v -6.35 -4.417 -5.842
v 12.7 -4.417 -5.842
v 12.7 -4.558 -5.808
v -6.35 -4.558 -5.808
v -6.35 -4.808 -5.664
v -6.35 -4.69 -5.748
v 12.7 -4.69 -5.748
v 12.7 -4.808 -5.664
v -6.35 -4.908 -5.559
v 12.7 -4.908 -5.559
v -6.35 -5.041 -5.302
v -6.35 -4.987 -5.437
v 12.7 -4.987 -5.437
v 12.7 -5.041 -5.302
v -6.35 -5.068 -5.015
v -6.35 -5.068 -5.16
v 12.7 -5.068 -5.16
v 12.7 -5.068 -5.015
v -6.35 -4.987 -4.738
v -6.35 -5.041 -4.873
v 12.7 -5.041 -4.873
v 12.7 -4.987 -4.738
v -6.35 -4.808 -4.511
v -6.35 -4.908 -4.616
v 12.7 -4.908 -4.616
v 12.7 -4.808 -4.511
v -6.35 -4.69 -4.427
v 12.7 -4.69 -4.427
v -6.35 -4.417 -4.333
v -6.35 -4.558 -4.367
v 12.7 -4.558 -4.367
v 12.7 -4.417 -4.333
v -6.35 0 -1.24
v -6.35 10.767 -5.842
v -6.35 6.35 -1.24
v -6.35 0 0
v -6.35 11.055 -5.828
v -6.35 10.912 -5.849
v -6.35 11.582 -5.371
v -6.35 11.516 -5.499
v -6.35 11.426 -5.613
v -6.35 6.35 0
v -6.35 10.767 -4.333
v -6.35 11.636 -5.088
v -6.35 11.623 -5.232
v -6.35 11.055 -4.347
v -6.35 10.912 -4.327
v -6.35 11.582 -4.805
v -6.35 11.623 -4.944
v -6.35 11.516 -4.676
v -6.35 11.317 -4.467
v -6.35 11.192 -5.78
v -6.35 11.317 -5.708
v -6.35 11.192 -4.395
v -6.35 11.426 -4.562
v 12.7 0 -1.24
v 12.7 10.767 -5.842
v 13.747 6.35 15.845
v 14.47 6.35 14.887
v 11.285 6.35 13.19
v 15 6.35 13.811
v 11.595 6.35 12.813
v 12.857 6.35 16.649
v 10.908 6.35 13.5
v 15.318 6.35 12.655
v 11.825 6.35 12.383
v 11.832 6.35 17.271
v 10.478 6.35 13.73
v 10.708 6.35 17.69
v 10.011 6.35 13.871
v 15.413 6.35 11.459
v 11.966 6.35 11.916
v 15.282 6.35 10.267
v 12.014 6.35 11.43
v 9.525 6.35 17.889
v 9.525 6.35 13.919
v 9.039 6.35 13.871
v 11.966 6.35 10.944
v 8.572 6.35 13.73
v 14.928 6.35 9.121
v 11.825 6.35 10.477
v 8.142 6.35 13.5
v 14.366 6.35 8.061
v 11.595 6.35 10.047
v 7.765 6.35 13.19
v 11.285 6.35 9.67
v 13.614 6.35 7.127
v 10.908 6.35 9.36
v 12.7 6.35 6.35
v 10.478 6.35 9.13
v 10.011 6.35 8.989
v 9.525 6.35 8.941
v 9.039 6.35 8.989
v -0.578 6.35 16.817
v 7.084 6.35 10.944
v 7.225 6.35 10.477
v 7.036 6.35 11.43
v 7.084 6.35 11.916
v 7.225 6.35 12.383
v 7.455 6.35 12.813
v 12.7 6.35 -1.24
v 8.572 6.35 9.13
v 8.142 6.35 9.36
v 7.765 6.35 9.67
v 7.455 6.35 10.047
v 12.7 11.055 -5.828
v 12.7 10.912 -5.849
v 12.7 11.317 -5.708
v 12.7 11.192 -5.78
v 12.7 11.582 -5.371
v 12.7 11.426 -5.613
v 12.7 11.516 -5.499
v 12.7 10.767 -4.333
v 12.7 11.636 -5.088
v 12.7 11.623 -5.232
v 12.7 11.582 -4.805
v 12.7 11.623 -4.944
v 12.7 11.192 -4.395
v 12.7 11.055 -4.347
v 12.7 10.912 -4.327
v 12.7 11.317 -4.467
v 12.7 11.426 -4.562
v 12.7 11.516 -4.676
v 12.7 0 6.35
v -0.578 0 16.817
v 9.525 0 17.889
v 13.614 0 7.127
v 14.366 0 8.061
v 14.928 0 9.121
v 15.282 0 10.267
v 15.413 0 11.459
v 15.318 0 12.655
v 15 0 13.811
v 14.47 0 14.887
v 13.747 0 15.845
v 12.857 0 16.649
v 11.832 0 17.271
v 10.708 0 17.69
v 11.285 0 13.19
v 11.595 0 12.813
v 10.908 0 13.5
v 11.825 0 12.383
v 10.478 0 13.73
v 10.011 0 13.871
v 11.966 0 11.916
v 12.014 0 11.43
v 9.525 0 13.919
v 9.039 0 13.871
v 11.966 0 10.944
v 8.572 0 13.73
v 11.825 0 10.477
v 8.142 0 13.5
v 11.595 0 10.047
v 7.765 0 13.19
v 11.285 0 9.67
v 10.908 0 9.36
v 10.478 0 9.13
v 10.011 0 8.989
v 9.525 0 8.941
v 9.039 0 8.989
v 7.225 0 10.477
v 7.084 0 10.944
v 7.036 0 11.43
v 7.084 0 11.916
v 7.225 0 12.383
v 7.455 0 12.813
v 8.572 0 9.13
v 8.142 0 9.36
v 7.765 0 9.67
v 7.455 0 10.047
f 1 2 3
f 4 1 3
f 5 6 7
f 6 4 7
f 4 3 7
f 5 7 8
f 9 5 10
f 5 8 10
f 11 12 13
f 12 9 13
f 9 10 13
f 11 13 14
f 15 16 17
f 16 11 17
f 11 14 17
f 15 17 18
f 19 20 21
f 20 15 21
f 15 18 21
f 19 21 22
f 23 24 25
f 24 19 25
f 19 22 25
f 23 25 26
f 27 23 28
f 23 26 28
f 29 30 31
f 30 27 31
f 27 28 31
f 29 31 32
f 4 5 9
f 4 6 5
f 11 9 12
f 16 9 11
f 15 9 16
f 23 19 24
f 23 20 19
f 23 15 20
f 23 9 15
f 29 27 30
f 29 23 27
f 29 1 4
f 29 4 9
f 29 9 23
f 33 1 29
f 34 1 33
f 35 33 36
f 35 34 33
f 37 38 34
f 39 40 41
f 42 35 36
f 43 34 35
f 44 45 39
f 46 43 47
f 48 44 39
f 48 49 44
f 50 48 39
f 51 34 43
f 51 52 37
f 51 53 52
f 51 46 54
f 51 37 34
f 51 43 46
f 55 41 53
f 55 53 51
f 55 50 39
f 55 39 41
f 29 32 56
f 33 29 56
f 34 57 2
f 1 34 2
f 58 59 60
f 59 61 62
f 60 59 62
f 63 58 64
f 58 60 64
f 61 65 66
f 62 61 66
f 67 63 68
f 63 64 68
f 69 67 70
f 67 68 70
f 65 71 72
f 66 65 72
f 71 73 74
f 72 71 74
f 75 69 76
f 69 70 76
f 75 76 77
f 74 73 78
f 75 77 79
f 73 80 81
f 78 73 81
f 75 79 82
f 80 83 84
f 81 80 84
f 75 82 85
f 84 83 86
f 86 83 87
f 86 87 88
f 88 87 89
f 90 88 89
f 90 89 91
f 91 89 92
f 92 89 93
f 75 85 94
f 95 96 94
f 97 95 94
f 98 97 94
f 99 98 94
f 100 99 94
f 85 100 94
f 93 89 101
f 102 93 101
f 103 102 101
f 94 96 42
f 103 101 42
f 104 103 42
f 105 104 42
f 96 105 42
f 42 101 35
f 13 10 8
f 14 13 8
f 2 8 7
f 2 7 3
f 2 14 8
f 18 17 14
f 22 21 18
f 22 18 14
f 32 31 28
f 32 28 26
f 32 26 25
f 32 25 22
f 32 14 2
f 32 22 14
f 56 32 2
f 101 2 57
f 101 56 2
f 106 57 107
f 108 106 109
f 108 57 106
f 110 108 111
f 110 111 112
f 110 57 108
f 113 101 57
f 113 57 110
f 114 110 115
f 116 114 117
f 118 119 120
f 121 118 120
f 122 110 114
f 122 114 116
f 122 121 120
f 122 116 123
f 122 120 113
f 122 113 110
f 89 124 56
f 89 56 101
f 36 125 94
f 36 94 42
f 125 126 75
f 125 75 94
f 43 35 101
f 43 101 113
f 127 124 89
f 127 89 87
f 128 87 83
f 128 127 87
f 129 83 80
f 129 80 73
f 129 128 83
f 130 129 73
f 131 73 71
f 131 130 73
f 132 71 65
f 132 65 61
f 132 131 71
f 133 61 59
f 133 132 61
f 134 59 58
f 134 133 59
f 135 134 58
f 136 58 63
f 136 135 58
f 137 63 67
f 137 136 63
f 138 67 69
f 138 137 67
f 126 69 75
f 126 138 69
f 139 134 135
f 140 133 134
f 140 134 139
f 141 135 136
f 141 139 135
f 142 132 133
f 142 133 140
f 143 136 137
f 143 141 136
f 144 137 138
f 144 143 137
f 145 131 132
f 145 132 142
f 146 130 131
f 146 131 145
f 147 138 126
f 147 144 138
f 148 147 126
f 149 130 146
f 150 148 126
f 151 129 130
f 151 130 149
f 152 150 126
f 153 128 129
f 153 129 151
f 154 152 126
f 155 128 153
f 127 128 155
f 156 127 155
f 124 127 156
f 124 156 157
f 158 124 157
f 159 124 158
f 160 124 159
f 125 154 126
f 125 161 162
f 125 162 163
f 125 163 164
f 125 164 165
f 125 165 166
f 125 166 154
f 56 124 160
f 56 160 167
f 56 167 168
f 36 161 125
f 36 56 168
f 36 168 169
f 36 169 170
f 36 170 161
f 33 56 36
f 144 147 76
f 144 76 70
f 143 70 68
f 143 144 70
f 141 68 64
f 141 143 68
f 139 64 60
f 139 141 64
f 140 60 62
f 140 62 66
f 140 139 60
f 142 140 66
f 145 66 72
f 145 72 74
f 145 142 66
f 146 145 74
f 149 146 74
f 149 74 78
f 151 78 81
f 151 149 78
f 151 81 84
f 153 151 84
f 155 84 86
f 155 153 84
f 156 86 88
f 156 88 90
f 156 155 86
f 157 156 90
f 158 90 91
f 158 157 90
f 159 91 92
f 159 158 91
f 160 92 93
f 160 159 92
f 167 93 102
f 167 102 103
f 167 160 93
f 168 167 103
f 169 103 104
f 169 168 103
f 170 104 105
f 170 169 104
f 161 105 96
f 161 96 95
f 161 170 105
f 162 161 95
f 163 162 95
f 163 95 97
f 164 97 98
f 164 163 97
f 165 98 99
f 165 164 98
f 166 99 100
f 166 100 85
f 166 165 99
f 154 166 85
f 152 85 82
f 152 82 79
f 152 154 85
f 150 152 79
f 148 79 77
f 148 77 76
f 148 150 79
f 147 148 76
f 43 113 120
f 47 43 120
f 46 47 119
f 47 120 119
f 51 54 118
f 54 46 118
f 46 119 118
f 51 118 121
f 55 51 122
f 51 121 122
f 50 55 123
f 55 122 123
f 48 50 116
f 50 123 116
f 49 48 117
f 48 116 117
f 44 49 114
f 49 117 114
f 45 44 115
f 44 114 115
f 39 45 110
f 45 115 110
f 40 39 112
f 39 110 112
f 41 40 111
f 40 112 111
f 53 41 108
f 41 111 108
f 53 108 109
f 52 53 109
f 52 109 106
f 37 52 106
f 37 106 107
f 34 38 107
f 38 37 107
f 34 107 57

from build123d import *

# Parameters (mm, degrees)
SKETCH1_R               = 2.4892
BOSS_EXTRUDE1_DEPTH     = 6.35
BOSS_EXTRUDE2_START     = -6.35
BOSS_EXTRUDE2_DEPTH     = 19.05
BOSS_EXTRUDE2_START_2   = -6.555460136
BOSS_EXTRUDE2_2_DEPTH   = 19.460920272
BOSS_EXTRUDE2_START_3   = -10
BOSS_EXTRUDE2_3_DEPTH   = 3.65
CUT_EXTRUDE1_DEPTH      = 27.910448217
CUT_EXTRUDE1_DEPTH_BACK = 27.910448217
SKETCH3_W               = 2.179354936
SKETCH3_H               = 6.35
CUT_EXTRUDE2_DEPTH      = 31.98795935
CUT_EXTRUDE2_DEPTH_BACK = 31.98795935


with BuildPart() as part:
    # Sketch1 → Boss-Extrude1 (new body)
    with BuildSketch(Plane(origin=(0, 0, 0), x_dir=(1, 0, 0), z_dir=(0, 1, 0))):
        with BuildLine():
            Line((9.525, -17.889269346), (-0.578271622, -16.817120786))
            Line((-0.578271622, -16.817120786), (-6.35, 0))
            Line((-6.35, 0), (12.7, 0))
            Line((12.7, 0), (12.7, -6.35))
            ThreePointArc((12.7, -6.35), (15.186560179, -13.240601753), (9.525, -17.889269346))
        make_face()
        with Locations(Location((9.525, -11.43, 0), (0, 0, 270))):
            Circle(SKETCH1_R, mode=Mode.SUBTRACT)
    extrude(amount=BOSS_EXTRUDE1_DEPTH)

    # Boss-Extrude2: read off the stored shape, not the designer's step
    # Boss-Extrude2 outline → Boss-Extrude2 (add)
    with BuildSketch(Plane.YZ.offset(BOSS_EXTRUDE2_START)):
        with BuildLine():
            ThreePointArc((11.551615481, -6.35), (12.905510296, -4.996105185), (11.551615481, -3.642210371))
            Line((11.551615481, -3.642210371), (6.35, 0))
            Line((6.35, 0), (0, 0))
            Line((0, 0), (-5.201615481, -3.642210371))
            ThreePointArc((-5.201615481, -3.642210371), (-6.555510296, -4.996105185), (-5.201615481, -6.35))
            Line((-5.201615481, -6.35), (11.551615481, -6.35))
        make_face()
    extrude(amount=BOSS_EXTRUDE2_DEPTH)

    # Boss-Extrude2 2 outline → Boss-Extrude2 2 (add)
    with BuildSketch(Plane(origin=(0, 0, 0), x_dir=(1, 0, 0), z_dir=(0, 1, 0)).offset(BOSS_EXTRUDE2_START_2)):
        Polygon((-8.529354936, 6.35), (-6.35, 0), (-6.35, 6.35), align=None)
    extrude(amount=BOSS_EXTRUDE2_2_DEPTH)

    # Boss-Extrude2 3 outline → Boss-Extrude2 3 (cut)
    with BuildSketch(Plane.YZ.offset(BOSS_EXTRUDE2_START_3)):
        with BuildLine():
            Line((12.905460136, 0), (6.35, 0))
            Line((6.35, 0), (11.551615481, -3.642210371))
            ThreePointArc((11.551615481, -3.642210371), (12.504834401, -4.034645431), (12.905460136, -4.984450993))
            Line((12.905460136, -4.984450993), (12.905460136, 0))
        make_face()
        with BuildLine():
            ThreePointArc((12.905460136, -5.007759378), (12.504834401, -5.95756494), (11.551615481, -6.35))
            Line((11.551615481, -6.35), (12.905460136, -6.35))
            Line((12.905460136, -6.35), (12.905460136, -5.007759378))
        make_face()
        with BuildLine():
            Line((0, 0), (-6.555460136, 0))
            Line((-6.555460136, 0), (-6.555460136, -4.984450993))
            ThreePointArc((-6.555460136, -4.984450993), (-6.154834401, -4.034645431), (-5.201615481, -3.642210371))
            Line((-5.201615481, -3.642210371), (0, 0))
        make_face()
        with BuildLine():
            ThreePointArc((-5.201615481, -6.35), (-6.154834401, -5.95756494), (-6.555460136, -5.007759378))
            Line((-6.555460136, -5.007759378), (-6.555460136, -6.35))
            Line((-6.555460136, -6.35), (-5.201615481, -6.35))
        make_face()
    extrude(amount=BOSS_EXTRUDE2_3_DEPTH, mode=Mode.SUBTRACT)

    # Sketch3 → Cut-Extrude1 (cut, two sides: drawn at the far end of the back side and taken through both)
    with BuildSketch(Plane.XZ.offset(-CUT_EXTRUDE1_DEPTH_BACK)):
        with Locations((-7.439677468, -3.175)):
            Rectangle(SKETCH3_W, SKETCH3_H)
    extrude(amount=CUT_EXTRUDE1_DEPTH + CUT_EXTRUDE1_DEPTH_BACK, mode=Mode.SUBTRACT)

    # Sketch4 → Cut-Extrude2 (cut, two sides: drawn at the far end of the back side and taken through both)
    with BuildSketch(Plane.ZY.offset(6.35).offset(-CUT_EXTRUDE2_DEPTH_BACK)):
        with BuildLine():
            ThreePointArc((-5.842, -4.417095512), (-5.087595278, -5.071775822), (-4.333190556, -4.417095512))
            Line((-4.333190556, -4.417095512), (-1.240306982, 0))
            Line((-1.240306982, 0), (0, 0))
            Line((0, 0), (-3.642210371, -5.201615481))
            ThreePointArc((-3.642210371, -5.201615481), (-4.996105185, -6.555510296), (-6.35, -5.201615481))
            Line((-6.35, -5.201615481), (-6.35, 11.551615481))
            ThreePointArc((-6.35, 11.551615481), (-4.996105185, 12.905510296), (-3.642210371, 11.551615481))
            Line((-3.642210371, 11.551615481), (0, 6.35))
            Line((0, 6.35), (-1.240306982, 6.35))
            Line((-1.240306982, 6.35), (-4.333190556, 10.767095512))
            ThreePointArc((-4.333190556, 10.767095512), (-5.087595278, 11.636415201), (-5.842, 10.767095512))
            Line((-5.842, 10.767095512), (-5.842, -4.417095512))
        make_face()
    extrude(amount=CUT_EXTRUDE2_DEPTH + CUT_EXTRUDE2_DEPTH_BACK, mode=Mode.SUBTRACT)


solid = part.part
